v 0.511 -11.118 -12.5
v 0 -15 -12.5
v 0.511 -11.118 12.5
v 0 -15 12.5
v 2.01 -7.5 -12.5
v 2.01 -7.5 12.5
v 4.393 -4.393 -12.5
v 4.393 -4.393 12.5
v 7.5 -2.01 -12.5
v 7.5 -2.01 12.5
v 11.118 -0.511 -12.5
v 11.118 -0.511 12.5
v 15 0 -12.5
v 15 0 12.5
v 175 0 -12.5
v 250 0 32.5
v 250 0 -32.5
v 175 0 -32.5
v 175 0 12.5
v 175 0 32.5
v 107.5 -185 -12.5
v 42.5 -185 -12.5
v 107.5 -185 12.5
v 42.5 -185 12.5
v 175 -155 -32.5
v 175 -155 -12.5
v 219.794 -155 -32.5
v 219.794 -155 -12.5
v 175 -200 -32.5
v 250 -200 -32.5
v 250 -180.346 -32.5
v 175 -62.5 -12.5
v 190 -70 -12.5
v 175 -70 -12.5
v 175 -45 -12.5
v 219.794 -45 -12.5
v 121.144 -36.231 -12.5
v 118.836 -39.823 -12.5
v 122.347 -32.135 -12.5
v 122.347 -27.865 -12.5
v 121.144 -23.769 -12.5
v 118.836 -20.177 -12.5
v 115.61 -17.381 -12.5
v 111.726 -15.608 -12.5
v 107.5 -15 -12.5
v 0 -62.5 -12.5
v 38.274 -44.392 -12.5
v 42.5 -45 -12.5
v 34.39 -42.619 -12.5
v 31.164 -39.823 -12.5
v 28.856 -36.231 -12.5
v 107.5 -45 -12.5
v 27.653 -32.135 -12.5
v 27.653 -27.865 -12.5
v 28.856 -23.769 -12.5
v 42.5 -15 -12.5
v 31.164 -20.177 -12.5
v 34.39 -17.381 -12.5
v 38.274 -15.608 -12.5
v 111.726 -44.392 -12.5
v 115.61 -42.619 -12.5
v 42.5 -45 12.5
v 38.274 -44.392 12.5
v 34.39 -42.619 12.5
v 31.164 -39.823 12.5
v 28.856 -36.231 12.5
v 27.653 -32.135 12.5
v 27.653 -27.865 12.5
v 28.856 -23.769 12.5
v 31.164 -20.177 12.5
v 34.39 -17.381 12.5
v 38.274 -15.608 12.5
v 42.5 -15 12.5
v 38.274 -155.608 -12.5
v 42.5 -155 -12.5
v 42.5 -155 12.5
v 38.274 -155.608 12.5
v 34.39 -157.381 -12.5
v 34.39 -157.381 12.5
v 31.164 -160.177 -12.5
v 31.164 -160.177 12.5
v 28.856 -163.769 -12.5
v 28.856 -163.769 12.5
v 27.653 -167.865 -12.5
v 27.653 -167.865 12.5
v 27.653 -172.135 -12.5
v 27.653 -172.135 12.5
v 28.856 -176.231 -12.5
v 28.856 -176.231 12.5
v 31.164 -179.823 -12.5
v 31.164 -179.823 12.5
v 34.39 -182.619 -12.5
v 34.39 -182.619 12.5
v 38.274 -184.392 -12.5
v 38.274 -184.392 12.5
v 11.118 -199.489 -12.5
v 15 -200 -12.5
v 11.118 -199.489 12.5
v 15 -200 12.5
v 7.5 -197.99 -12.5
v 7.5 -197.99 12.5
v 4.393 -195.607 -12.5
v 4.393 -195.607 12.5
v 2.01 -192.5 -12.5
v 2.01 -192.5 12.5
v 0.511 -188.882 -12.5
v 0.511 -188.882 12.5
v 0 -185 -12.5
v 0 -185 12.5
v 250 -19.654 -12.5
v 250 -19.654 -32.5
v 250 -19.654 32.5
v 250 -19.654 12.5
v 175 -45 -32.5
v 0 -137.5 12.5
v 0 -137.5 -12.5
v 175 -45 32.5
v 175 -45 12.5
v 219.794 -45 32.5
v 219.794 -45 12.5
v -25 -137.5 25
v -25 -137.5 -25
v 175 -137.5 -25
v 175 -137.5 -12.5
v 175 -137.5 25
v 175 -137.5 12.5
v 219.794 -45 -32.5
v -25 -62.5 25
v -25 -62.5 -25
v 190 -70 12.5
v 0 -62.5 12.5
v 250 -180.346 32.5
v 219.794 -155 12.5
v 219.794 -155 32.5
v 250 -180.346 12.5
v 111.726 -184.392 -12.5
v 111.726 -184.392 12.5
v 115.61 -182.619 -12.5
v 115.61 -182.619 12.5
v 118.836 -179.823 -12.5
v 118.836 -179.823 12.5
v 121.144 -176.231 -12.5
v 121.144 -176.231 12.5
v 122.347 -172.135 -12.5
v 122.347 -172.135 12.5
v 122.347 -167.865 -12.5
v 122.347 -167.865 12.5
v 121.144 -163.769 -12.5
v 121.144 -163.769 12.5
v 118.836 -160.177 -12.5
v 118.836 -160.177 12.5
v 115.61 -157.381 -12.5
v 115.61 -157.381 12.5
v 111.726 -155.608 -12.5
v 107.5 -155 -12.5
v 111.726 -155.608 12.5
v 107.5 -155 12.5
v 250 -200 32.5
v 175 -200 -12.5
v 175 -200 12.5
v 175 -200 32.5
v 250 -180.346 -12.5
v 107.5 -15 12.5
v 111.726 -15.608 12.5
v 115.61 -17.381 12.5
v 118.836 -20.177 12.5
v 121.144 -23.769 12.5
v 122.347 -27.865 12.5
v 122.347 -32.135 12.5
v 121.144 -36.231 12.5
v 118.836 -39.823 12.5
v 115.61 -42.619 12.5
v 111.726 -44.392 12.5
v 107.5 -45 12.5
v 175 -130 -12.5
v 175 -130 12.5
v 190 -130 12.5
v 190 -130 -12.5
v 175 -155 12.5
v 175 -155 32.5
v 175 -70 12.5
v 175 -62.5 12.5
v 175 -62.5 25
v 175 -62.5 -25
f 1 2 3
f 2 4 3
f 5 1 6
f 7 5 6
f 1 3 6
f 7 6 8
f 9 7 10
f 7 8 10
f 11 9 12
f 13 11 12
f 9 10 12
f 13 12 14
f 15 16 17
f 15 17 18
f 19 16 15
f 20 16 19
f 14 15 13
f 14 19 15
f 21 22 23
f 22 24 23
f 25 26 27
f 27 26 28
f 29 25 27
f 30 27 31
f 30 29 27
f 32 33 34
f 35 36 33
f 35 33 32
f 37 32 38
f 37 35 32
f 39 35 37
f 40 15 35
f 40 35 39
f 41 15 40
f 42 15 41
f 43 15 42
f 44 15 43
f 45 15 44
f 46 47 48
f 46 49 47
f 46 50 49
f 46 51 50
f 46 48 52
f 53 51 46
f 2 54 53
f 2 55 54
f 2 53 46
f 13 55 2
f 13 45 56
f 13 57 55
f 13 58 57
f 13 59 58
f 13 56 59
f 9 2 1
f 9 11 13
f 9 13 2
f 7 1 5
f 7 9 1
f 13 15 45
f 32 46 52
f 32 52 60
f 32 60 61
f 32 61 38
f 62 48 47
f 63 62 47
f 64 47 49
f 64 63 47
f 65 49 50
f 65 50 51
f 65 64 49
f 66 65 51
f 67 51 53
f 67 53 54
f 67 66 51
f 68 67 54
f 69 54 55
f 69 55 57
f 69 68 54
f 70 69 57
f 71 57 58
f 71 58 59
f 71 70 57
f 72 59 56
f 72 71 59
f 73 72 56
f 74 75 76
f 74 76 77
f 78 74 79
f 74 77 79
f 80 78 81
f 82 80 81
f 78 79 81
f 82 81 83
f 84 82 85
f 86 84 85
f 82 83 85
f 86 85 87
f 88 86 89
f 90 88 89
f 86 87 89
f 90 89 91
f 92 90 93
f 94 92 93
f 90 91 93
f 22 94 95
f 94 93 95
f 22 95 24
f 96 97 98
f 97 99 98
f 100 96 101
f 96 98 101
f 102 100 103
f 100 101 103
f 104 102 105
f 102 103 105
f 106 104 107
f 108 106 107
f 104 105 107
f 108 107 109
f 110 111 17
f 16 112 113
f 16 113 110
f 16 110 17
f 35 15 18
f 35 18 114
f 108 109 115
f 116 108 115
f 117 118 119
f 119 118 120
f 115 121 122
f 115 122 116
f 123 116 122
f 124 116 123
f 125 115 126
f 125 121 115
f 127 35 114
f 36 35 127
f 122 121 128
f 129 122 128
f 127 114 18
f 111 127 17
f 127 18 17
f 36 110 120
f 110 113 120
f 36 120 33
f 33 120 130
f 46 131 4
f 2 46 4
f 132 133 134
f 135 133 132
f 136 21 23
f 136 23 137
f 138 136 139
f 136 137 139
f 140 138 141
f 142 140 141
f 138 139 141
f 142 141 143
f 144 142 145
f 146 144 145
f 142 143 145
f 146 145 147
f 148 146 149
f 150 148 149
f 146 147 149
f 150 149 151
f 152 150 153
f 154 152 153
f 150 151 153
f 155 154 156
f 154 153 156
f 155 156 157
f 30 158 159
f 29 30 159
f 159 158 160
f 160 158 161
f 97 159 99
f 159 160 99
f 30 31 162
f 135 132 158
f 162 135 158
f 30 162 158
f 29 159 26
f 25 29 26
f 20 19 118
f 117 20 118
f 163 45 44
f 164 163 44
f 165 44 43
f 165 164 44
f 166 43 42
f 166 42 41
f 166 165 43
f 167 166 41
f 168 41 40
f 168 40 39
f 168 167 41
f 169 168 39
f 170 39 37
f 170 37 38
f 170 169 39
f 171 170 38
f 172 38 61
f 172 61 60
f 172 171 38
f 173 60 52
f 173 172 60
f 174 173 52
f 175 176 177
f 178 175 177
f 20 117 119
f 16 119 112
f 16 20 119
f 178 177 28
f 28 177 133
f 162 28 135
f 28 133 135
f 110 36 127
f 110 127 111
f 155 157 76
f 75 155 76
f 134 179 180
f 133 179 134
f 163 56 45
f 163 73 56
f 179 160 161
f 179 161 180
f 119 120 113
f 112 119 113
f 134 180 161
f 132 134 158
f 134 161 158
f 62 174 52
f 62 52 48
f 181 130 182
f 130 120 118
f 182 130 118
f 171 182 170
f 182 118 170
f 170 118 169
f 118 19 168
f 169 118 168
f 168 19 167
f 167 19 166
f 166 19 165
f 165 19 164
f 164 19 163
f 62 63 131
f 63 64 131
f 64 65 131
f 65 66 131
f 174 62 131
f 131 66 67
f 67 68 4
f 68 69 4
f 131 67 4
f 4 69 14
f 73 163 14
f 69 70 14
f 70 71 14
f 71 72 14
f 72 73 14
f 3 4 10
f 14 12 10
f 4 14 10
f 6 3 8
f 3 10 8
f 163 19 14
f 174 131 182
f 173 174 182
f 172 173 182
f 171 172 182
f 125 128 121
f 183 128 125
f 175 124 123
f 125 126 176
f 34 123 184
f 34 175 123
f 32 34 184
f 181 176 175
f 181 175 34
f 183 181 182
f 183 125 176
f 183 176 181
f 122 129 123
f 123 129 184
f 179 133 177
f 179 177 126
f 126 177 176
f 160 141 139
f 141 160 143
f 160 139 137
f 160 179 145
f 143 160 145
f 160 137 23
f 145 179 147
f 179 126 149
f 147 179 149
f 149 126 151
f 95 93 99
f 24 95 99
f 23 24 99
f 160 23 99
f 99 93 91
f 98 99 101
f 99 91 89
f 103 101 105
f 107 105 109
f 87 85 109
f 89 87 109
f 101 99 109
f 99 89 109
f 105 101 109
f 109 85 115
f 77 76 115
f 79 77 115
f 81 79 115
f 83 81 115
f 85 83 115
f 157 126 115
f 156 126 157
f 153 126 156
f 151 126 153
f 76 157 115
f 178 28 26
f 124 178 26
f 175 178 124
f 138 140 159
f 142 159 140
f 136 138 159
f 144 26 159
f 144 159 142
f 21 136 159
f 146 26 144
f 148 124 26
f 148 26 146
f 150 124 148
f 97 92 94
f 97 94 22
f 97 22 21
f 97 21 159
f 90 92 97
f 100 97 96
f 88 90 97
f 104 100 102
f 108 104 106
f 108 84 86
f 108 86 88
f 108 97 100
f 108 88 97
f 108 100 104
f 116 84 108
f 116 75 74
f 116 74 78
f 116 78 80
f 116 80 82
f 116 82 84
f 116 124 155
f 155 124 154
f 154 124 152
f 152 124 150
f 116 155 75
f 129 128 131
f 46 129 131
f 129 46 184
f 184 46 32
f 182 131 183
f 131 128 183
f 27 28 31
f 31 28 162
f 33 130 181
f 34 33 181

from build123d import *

# Parameters (mm, degrees)
BOSS_EXTRUDE1_DEPTH  = 12.5
SKETCH3_W            = 200
SKETCH3_H            = 75
BOSS_EXTRUDE2_DEPTH  = 25
BOSS_EXTRUDE3_DEPTH  = 20
MIRROR2_COPY_1_DEPTH = 20
FILLET2_R            = 15


with BuildPart() as part:
    # Sketch1 → Boss-Extrude1 (new, symmetric)
    with BuildSketch(Plane.XY):
        Polygon((0, 0), (250, 0), (250, -19.654022129), (190, -70), (150, -70), (150, -130), (190, -130), (250, -180.345977871), (250, -200), (0, -200), align=None)
        with BuildLine():
            Line((42.5, -15), (107.5, -15))
            ThreePointArc((107.5, -15), (122.5, -30), (107.5, -45))
            Line((107.5, -45), (42.5, -45))
            ThreePointArc((42.5, -45), (27.5, -30), (42.5, -15))
        make_face(mode=Mode.SUBTRACT)
        with BuildLine():
            Line((42.5, -185), (107.5, -185))
            ThreePointArc((107.5, -185), (122.5, -170), (107.5, -155))
            Line((107.5, -155), (42.5, -155))
            ThreePointArc((42.5, -155), (27.5, -170), (42.5, -185))
        make_face(mode=Mode.SUBTRACT)
    extrude(amount=BOSS_EXTRUDE1_DEPTH, both=True)

    # Sketch3 → Boss-Extrude2 (add, symmetric)
    with BuildSketch(Plane.XY):
        with Locations((75, -100)):
            Rectangle(SKETCH3_W, SKETCH3_H)
    extrude(amount=BOSS_EXTRUDE2_DEPTH, both=True)

    # Sketch4 → Boss-Extrude3 (add)
    with BuildSketch(Plane.XY.offset(12.5)):
        Polygon((250, 0), (175, 0), (175, -45), (219.793839815, -45), (250, -19.654022129), align=None)
    boss_extrude3 = extrude(amount=BOSS_EXTRUDE3_DEPTH)

    # Mirror1: Boss-Extrude3 across plane
    add(boss_extrude3.mirror(Plane.ZX.offset(-100)))

    # Mirror2: Boss-Extrude3 across plane
    add(boss_extrude3.mirror(Plane.XY))

    # Mirror2 copy 1 sketch → Mirror2 copy 1 (add)
    with BuildSketch(Plane(origin=(0, -200, -12.5), x_dir=(1, 0, 0), z_dir=(0, 0, -1))):
        Polygon((250, 0), (175, 0), (175, -45), (219.793839815, -45), (250, -19.654022129), align=None)
    extrude(amount=MIRROR2_COPY_1_DEPTH)

    # Fillet2
    fillet2_edges = [part.edges().sort_by_distance(p)[0] for p in [
        (0, 0, 0),
        (0, -200, 0),
    ]]
    fillet(fillet2_edges, radius=FILLET2_R)


solid = part.part
